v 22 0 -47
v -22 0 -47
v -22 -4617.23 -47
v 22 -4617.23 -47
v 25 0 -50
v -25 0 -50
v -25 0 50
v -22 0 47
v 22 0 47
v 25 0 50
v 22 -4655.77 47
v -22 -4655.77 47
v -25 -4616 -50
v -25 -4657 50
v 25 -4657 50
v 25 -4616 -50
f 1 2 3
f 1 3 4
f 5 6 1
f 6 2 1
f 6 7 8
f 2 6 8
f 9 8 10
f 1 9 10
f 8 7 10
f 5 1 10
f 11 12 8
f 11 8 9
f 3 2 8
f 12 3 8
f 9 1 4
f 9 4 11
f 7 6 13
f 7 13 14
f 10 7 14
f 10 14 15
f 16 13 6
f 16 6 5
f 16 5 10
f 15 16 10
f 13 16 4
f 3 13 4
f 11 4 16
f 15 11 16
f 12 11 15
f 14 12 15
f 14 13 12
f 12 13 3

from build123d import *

# Parameters (mm, degrees)
F0_W        = 50
F0_H        = 100
F0_W_2      = 44
F0_H_2      = 94
F1_DEPTH    = 4657
F2_T1_DEPTH = 568.5605442995


# Not quite as in the source:
# - a fillet or chamfer that OpenCascade refuses, or shapes differently, is made with other operations: its cross-section is extruded or revolved along the edge and cut away or added


with BuildPart() as f1:
    # F0 (on Front) → F1 (new body)
    with BuildSketch(Plane.XZ):
        Rectangle(F0_W, F0_H)
        Rectangle(F0_W_2, F0_H_2, mode=Mode.SUBTRACT)
    extrude(amount=F1_DEPTH)

    # F2: chamfer of 41 x 100 on 1 edges, made by hand

    # F2_s2 → F2_t1 (cut)
    with BuildSketch(Plane.YZ.offset(-284.2802721497)):
        Polygon((-4616, -50), (-4657, 50), (-4657, -50), align=None)
    extrude(amount=F2_T1_DEPTH, mode=Mode.SUBTRACT)


solid = f1.part
